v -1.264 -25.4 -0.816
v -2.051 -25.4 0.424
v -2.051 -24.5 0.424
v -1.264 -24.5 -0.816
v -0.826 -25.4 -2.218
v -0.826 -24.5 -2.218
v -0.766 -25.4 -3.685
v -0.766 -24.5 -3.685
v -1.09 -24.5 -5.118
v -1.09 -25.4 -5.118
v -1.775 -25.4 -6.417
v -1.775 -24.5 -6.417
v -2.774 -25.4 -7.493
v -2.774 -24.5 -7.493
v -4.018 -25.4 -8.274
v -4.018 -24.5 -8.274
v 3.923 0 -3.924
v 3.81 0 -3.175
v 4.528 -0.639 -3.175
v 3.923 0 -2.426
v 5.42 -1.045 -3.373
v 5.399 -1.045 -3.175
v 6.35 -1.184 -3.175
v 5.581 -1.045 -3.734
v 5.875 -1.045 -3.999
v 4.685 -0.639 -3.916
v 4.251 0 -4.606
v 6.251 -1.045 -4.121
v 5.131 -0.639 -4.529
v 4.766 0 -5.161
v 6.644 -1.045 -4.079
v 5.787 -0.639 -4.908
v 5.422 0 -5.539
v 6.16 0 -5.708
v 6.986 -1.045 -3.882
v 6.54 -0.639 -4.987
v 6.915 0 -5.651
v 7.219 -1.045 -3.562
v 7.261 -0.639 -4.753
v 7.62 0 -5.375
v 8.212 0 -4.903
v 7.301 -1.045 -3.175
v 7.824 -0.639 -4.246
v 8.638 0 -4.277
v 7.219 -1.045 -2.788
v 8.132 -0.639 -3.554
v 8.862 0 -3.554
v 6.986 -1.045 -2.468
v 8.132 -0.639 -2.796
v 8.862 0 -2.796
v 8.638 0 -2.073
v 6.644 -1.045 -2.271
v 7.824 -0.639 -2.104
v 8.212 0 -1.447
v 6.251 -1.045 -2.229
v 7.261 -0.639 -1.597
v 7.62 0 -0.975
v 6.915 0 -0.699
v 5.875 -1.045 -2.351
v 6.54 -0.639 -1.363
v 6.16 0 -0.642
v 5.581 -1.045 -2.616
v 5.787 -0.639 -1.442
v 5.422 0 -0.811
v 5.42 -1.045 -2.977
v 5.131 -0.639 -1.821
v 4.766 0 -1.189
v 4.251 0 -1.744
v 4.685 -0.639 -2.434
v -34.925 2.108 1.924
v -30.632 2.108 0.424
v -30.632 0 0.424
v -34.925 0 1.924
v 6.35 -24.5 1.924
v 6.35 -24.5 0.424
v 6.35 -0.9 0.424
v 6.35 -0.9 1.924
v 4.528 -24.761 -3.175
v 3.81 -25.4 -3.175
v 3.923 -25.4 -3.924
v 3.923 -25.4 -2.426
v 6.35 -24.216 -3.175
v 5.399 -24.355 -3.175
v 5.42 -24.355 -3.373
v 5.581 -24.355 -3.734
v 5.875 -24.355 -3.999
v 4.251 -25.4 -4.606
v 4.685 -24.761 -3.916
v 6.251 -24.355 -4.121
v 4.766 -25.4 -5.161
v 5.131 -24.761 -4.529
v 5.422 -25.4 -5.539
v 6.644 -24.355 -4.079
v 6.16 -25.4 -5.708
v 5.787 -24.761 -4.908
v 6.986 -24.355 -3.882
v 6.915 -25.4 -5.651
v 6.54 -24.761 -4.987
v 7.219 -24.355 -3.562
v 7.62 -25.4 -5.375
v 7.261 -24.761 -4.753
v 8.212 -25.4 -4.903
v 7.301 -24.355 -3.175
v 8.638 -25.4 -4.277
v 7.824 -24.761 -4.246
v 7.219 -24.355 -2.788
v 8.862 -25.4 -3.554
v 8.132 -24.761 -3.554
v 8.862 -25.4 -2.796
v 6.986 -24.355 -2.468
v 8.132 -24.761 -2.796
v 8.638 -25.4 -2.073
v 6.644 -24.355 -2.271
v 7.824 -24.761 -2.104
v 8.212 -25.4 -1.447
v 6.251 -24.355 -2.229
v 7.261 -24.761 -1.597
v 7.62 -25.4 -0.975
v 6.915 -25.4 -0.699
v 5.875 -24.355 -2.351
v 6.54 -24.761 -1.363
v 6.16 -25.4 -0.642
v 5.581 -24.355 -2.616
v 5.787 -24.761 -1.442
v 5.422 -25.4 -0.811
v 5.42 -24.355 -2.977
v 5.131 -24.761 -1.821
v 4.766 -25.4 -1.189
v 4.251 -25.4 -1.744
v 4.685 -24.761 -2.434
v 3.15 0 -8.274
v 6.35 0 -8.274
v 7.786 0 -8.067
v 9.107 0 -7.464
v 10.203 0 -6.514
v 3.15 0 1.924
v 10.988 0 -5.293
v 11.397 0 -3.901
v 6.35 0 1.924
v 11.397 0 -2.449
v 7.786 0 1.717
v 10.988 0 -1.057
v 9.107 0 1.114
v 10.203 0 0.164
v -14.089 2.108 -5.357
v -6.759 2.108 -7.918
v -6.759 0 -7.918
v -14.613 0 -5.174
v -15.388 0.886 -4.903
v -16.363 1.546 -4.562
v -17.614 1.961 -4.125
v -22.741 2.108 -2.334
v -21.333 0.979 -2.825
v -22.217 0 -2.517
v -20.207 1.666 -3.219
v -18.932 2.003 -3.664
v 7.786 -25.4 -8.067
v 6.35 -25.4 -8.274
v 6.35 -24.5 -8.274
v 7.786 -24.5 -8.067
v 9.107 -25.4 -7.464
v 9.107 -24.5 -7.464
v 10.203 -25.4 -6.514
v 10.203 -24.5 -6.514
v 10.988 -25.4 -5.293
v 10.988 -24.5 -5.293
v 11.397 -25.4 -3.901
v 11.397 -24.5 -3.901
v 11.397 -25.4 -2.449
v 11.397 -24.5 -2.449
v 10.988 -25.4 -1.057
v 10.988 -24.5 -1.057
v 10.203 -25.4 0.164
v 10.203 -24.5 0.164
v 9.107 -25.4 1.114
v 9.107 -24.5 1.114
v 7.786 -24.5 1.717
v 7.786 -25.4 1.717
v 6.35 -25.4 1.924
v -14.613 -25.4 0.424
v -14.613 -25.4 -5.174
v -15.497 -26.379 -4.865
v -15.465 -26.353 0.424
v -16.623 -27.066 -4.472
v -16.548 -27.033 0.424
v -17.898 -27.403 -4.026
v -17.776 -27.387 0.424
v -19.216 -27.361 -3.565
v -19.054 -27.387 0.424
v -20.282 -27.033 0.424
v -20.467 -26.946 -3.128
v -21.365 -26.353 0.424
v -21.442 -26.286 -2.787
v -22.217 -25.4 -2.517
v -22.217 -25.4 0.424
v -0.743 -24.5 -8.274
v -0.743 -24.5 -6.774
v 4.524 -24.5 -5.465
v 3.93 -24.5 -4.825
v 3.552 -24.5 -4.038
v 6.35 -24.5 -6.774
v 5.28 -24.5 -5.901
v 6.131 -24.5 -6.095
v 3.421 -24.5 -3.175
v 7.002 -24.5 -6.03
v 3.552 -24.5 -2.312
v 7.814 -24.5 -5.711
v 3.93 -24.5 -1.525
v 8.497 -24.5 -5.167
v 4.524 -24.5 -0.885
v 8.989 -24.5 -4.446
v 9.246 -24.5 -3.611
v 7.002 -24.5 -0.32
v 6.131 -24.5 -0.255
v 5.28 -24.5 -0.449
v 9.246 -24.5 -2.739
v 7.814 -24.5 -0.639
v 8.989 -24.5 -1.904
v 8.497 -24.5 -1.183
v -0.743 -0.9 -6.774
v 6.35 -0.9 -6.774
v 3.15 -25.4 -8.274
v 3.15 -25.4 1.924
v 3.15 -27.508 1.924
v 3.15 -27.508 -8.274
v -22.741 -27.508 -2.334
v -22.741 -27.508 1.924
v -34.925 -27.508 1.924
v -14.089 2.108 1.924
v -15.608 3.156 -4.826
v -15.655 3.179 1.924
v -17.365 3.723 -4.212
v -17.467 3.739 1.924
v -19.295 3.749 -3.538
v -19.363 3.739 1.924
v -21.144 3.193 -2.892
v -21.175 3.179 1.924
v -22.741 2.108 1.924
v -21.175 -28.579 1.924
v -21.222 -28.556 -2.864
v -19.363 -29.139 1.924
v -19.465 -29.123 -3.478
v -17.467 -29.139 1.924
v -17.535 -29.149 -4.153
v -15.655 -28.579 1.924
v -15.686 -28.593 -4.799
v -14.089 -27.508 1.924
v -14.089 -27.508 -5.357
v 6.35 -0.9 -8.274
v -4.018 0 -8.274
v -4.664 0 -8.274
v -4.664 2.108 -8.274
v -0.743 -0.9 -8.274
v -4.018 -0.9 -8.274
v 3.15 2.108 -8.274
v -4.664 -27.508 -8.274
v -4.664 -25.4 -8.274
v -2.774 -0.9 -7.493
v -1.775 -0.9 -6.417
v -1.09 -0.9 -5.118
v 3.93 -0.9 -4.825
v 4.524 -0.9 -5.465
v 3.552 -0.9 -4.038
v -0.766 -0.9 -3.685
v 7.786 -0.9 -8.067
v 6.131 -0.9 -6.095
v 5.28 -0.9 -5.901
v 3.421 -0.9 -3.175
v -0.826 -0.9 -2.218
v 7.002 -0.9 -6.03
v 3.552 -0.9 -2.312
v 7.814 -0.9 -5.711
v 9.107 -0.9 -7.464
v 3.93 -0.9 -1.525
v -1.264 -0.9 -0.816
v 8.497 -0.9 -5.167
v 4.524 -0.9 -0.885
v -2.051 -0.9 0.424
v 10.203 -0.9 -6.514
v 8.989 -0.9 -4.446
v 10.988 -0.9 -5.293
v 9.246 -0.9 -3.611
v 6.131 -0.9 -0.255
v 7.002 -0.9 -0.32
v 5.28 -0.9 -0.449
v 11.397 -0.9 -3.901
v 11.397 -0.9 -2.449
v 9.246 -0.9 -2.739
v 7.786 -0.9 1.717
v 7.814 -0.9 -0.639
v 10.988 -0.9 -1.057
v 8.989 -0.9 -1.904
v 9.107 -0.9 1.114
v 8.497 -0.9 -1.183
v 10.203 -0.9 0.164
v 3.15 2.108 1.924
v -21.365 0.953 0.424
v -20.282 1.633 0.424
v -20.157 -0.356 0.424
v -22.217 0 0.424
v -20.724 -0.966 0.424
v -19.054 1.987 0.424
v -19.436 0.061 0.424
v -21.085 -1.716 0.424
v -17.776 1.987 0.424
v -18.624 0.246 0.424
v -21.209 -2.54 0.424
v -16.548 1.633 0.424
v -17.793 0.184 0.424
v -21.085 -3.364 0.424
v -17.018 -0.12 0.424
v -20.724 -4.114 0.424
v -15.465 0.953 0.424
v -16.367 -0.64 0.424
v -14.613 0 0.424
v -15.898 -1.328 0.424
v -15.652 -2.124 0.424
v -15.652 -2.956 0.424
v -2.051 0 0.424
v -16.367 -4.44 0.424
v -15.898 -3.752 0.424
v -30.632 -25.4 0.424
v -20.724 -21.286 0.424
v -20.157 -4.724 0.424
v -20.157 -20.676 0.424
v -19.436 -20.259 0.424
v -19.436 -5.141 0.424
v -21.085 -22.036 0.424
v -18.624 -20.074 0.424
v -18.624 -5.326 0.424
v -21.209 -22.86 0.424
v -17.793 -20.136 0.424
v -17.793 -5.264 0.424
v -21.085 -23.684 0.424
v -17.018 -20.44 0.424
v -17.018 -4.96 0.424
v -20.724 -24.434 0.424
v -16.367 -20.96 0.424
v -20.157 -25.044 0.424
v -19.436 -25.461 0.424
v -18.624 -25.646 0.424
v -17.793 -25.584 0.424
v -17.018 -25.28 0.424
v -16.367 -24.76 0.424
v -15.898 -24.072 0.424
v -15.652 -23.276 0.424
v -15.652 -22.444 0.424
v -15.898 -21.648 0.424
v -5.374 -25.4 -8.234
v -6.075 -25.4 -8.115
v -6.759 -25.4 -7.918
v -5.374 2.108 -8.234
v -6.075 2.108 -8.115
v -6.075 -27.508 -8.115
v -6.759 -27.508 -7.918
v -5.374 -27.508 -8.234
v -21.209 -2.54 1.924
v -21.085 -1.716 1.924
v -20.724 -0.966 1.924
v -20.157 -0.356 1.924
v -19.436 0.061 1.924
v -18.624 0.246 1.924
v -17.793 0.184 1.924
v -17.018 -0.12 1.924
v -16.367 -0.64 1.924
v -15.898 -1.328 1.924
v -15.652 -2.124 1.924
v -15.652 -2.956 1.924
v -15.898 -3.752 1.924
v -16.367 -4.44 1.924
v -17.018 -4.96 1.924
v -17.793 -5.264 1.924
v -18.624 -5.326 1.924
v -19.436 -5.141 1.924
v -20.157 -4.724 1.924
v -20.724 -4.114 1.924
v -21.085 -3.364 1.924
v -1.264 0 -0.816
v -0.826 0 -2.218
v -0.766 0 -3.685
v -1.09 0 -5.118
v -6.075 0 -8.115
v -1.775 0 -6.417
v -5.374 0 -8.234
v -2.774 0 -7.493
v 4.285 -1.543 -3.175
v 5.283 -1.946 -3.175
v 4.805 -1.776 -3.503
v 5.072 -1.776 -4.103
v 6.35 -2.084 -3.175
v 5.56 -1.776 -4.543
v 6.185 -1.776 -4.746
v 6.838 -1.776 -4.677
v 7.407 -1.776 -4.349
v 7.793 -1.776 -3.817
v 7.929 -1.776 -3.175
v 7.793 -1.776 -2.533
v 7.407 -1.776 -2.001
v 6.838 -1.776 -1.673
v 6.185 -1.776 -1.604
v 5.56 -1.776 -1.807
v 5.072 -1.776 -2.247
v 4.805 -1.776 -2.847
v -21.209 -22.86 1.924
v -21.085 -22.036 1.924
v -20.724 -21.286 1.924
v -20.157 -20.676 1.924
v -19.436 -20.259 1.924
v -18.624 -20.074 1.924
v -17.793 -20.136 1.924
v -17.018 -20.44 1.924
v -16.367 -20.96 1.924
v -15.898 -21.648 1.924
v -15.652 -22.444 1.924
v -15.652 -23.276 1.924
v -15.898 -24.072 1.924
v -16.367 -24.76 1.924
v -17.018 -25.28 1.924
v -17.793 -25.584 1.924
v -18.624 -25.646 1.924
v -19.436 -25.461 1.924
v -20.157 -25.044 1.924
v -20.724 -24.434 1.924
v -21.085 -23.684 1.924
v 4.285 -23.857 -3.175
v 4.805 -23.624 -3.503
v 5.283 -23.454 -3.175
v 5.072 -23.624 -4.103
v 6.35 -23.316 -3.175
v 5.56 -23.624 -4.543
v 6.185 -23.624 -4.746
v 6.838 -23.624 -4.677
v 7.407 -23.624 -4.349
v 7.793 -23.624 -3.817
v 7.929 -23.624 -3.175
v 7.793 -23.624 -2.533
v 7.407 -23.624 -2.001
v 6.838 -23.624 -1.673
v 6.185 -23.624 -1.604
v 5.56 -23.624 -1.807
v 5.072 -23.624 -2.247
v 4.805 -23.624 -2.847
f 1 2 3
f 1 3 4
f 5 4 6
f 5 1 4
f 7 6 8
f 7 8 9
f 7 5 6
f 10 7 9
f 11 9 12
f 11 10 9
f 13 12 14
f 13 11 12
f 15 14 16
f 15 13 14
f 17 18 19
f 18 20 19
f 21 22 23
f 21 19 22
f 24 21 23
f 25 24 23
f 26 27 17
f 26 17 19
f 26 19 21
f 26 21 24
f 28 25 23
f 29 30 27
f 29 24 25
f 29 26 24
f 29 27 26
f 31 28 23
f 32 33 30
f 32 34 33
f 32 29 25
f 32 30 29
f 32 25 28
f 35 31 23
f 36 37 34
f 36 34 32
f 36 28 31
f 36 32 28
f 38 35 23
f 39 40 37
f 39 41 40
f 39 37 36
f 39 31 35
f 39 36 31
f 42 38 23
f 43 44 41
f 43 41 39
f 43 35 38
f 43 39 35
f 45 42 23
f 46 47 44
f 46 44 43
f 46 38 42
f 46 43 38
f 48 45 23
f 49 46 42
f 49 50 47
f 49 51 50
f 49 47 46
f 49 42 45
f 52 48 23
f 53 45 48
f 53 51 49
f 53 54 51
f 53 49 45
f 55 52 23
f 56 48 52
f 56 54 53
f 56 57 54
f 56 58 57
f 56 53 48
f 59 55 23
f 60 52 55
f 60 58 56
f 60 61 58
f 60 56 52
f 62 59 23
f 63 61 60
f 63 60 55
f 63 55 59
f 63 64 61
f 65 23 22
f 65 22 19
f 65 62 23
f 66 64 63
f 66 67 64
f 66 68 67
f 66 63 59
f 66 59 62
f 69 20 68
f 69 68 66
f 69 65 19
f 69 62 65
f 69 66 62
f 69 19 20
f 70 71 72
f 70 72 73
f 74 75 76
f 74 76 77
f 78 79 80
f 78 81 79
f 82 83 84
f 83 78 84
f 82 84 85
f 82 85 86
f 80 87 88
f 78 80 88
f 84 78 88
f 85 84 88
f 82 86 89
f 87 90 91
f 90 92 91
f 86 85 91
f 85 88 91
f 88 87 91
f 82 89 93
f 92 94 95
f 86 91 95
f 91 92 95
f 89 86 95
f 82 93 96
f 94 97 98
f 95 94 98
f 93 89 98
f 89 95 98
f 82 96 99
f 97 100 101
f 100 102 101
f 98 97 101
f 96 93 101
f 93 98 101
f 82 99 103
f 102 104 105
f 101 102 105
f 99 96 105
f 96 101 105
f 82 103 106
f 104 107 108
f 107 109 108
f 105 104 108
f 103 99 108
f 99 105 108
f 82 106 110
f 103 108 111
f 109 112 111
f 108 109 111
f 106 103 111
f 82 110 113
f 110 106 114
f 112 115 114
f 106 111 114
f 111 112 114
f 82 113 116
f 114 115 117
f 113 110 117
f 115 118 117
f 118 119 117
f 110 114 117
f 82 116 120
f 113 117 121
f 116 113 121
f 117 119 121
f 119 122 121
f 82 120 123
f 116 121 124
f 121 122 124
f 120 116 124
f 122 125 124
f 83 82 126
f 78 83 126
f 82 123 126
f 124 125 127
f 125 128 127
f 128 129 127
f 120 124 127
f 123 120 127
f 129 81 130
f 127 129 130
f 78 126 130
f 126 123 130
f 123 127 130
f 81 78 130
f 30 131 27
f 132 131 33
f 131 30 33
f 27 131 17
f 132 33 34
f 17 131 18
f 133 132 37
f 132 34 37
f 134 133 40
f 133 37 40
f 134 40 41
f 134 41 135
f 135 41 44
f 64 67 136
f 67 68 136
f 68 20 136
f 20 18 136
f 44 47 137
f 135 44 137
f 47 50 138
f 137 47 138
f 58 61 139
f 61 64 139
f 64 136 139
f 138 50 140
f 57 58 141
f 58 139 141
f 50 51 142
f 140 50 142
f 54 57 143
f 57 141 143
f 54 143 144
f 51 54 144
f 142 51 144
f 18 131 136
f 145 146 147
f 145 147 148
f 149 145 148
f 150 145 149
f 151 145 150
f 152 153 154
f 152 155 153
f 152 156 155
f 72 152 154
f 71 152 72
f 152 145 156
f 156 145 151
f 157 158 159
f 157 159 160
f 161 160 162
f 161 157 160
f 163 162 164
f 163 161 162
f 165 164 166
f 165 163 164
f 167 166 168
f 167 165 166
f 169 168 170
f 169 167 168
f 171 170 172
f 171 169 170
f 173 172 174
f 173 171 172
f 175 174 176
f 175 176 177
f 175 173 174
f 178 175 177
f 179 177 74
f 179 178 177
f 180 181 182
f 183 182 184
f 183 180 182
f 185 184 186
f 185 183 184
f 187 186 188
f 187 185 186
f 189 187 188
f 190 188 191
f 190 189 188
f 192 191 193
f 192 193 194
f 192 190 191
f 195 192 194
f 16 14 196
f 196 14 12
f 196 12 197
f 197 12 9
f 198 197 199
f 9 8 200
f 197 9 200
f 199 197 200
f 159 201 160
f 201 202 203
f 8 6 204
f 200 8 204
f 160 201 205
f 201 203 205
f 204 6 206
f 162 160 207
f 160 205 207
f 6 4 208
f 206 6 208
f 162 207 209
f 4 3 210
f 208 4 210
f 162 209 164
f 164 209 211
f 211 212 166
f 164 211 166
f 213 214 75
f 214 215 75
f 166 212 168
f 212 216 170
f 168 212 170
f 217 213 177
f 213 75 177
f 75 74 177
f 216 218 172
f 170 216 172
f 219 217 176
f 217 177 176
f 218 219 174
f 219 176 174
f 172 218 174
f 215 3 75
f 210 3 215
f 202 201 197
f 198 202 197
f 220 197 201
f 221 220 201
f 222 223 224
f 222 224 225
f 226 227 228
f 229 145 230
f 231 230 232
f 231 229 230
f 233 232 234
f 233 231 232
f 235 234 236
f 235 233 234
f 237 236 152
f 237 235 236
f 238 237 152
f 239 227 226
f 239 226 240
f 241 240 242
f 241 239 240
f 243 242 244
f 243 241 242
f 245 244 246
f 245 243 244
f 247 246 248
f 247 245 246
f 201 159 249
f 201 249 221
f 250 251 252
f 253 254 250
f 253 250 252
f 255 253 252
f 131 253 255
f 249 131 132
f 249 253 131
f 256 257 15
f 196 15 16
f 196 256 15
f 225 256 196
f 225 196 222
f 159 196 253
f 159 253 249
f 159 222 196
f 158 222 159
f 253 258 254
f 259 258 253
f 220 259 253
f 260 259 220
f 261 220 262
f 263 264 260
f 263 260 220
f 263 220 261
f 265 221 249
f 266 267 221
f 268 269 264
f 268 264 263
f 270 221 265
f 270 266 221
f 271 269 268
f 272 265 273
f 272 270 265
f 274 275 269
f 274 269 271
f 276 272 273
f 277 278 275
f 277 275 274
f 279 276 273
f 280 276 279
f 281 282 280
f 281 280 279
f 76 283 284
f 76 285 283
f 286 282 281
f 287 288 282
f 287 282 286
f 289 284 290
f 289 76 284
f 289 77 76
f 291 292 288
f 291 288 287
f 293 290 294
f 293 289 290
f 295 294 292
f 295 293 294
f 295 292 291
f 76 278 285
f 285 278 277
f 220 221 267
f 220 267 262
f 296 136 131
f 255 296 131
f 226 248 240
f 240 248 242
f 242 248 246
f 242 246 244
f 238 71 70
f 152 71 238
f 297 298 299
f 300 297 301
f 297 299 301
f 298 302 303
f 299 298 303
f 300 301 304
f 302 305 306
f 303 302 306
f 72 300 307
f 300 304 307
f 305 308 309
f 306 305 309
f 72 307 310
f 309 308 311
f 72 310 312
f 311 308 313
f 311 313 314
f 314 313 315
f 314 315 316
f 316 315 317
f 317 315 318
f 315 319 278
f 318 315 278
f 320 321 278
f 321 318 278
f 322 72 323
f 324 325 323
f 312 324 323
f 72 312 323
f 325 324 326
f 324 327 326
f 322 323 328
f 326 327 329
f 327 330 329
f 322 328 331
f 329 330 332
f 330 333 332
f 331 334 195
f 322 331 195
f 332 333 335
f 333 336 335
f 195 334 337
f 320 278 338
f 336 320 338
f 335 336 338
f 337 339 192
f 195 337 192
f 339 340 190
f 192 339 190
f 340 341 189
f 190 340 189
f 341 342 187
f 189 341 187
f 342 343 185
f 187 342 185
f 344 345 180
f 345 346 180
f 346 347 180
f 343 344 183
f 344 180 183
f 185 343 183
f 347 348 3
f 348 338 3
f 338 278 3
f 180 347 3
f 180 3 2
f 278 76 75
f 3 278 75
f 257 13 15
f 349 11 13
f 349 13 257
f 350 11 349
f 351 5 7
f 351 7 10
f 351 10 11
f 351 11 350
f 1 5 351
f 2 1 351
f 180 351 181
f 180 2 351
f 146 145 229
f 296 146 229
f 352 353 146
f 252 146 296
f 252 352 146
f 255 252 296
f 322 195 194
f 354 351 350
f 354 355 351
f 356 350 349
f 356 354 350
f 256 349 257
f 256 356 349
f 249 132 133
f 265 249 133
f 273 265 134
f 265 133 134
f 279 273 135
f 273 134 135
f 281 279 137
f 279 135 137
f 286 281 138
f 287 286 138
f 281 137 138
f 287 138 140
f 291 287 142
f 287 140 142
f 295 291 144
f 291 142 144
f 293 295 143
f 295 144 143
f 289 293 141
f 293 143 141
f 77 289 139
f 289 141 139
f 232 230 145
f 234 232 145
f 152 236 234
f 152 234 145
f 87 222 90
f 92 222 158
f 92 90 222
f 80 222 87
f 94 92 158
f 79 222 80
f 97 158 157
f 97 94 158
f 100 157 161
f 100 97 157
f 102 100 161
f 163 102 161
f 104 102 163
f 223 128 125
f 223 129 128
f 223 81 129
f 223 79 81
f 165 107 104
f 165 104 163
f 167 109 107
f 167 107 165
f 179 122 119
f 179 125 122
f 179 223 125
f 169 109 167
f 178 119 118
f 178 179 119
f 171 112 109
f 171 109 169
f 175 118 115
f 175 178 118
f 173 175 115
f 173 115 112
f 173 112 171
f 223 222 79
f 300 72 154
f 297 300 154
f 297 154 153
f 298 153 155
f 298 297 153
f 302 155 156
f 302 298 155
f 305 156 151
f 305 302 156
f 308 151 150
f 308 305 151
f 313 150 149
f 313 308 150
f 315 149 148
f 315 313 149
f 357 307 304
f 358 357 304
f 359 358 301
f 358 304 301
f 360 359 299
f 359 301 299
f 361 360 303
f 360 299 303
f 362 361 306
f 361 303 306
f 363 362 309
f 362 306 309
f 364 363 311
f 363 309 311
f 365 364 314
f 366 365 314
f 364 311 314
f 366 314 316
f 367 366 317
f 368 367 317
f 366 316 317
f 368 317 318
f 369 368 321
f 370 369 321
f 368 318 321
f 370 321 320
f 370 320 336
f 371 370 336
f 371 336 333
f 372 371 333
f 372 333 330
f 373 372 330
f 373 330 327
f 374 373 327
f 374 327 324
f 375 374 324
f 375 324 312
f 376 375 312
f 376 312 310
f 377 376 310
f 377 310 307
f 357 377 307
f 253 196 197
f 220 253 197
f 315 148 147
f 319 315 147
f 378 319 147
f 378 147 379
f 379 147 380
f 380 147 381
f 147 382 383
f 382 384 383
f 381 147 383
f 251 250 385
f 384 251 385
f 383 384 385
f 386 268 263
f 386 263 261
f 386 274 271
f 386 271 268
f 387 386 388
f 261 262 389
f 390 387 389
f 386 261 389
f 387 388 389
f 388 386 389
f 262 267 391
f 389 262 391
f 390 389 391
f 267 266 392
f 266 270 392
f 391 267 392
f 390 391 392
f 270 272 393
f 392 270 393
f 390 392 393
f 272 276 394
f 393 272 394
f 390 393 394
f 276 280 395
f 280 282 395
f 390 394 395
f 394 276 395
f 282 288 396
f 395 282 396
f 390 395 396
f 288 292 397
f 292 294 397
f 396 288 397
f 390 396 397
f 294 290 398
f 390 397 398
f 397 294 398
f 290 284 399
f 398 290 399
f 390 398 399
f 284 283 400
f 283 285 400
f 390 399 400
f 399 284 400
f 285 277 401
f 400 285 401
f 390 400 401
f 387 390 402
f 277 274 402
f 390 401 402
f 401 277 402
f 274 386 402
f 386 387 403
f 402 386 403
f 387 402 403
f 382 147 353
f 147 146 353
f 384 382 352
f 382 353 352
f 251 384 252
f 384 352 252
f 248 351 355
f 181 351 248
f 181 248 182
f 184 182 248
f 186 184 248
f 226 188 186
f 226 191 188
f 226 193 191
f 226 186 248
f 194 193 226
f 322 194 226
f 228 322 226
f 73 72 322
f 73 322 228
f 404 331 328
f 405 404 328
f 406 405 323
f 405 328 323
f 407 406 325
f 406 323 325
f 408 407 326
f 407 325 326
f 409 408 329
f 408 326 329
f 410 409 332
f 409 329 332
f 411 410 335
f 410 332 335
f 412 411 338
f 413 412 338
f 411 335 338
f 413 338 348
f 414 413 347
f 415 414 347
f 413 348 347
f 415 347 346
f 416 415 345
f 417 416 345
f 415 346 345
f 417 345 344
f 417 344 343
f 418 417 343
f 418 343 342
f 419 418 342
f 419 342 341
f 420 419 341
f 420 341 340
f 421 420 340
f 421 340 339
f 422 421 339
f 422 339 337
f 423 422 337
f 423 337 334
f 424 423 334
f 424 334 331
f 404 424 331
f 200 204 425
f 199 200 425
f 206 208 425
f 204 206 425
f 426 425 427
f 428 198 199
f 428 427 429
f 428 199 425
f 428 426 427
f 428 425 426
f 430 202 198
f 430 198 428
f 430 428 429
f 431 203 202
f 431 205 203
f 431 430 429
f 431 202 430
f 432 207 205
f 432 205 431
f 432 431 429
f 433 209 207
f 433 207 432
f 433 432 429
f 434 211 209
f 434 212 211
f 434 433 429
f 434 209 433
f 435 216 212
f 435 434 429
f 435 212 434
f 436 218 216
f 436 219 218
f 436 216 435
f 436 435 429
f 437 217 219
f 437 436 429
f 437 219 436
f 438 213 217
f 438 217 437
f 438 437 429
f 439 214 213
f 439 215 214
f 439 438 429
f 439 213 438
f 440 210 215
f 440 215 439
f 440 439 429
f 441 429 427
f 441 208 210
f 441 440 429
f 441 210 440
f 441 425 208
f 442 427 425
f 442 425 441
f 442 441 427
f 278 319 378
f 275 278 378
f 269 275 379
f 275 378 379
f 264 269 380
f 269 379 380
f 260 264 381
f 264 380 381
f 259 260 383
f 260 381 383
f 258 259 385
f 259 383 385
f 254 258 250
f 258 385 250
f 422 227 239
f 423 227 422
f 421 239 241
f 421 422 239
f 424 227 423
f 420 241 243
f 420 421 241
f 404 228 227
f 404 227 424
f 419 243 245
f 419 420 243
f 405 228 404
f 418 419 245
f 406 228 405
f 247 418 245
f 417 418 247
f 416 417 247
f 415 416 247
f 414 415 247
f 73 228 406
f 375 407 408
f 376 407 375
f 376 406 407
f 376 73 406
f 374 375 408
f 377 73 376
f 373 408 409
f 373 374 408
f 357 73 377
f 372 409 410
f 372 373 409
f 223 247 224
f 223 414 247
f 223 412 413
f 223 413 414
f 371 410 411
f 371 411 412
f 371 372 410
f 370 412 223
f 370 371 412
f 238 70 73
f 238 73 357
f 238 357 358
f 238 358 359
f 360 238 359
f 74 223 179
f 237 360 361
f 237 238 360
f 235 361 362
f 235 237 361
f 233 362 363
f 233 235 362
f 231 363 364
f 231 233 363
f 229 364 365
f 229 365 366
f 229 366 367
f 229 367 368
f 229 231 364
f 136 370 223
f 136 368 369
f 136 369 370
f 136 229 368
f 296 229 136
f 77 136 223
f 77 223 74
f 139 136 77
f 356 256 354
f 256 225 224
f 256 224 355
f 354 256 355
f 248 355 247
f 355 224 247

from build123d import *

# Parameters (mm, degrees)
BOSS_EXTRUDE2_DEPTH = 2.1082
BOSS_EXTRUDE3_DEPTH = 0.9
SKETCH13_W          = 8.400608993
SKETCH13_H          = 1.5
BOSS_EXTRUDE4_DEPTH = 12.7
SKETCH16_W          = 7.09322036
SKETCH16_H          = 1.5
BOSS_EXTRUDE5_DEPTH = 11.8
BOSS_EXTRUDE6_DEPTH = 2.1082
BOSS_EXTRUDE7_REACH = 45.656
BOSS_EXTRUDE8_DEPTH = 2.1082
FILLET1_R           = 6.35
SKETCH20_R          = 2.794
CUT_EXTRUDE1_DEPTH  = 46.30015706
SKETCH21_R          = 4.572
CUT_EXTRUDE2_DEPTH  = 46.30015706
BOSS_EXTRUDE9_REACH = 47.612


with BuildPart() as part:
    # Sketch6 → Boss-Extrude2 (new body)
    with BuildSketch(Plane(origin=(0, 0, 0), x_dir=(1, 0, 0), z_dir=(0, 1, 0))):
        with BuildLine():
            Line((3.1496, 3.175), (3.1496, 8.27377964))
            Line((3.1496, 8.27377964), (-5.741348421, 8.27377964))
            Line((-5.741348421, 8.27377964), (-8.59506403, 5.42006403))
            ThreePointArc((-8.59506403, 5.42006403), (-9.283317516, 4.390019898), (-9.525, 3.175))
            Line((-9.525, 3.175), (-9.525, -1.92377964))
            Line((-9.525, -1.92377964), (-6.989909723, -1.92377964))
            Line((-6.989909723, -1.92377964), (3.1496, -1.92377964))
            Line((3.1496, -1.92377964), (3.1496, 3.175))
        make_face()
    extrude(amount=BOSS_EXTRUDE2_DEPTH)

    # Sketch7 → Boss-Extrude3 (add)
    with BuildSketch(Plane.XZ):
        with BuildLine():
            Line((-2.050608993, 1.92377964), (-2.050608993, 0.42377964))
            ThreePointArc((-2.050608993, 0.42377964), (-0.881374643, -4.411978027), (-4.017957094, -8.27377964))
            Line((-4.017957094, -8.27377964), (6.35, -8.27377964))
            ThreePointArc((6.35, -8.27377964), (11.44877964, -3.175), (6.35, 1.92377964))
            Line((6.35, 1.92377964), (-2.050608993, 1.92377964))
        make_face()
    extrude(amount=BOSS_EXTRUDE3_DEPTH)

    # Sketch11 → Revolve4 (revolve)
    with BuildSketch(Plane.XY.offset(-3.175), mode=Mode.PRIVATE) as revolve4_sk:
        with BuildLine():
            Line((6.35, -0.9), (6.35, -2.083581452))
            ThreePointArc((6.35, -2.083581452), (7.929346537, -1.776499661), (9.278562256, -0.9))
            Line((9.278562256, -0.9), (6.35, -0.9))
        make_face()
    revolve(revolve4_sk.sketch.rotate(Axis((6.35, -0.9, -3.175), (0, -1, 0)), 180), axis=Axis((6.35, -0.9, -3.175), (0, -1, 0)))

    # Sketch12 → Cut-Revolve1 (revolve, cut)
    with BuildSketch(Plane.XY.offset(-3.175), mode=Mode.PRIVATE) as cut_revolve1_sk:
        with BuildLine():
            Line((8.89, 0), (6.35, 0))
            Line((6.35, 0), (6.35, -1.184421452))
            ThreePointArc((6.35, -1.184421452), (7.751289957, -0.873762947), (8.89, 0))
        make_face()
    revolve(cut_revolve1_sk.sketch.rotate(Axis((6.35, 0, -3.175), (0, -1, 0)), 180), axis=Axis((6.35, 0, -3.175), (0, -1, 0)), mode=Mode.SUBTRACT)

    # Sketch13 → Boss-Extrude4 (add)
    with BuildSketch(Plane.XZ):
        with Locations((2.149695504, 1.17377964)):
            Rectangle(SKETCH13_W, SKETCH13_H)
    extrude(amount=BOSS_EXTRUDE4_DEPTH)

    # Sketch16 → Boss-Extrude5 (add)
    with BuildSketch(Plane.XZ.offset(0.9)):
        with Locations((2.80338982, -7.52377964)):
            Rectangle(SKETCH16_W, SKETCH16_H)
    extrude(amount=BOSS_EXTRUDE5_DEPTH)

    # Mirror1: part across plane


with BuildPart() as part_1:
    add(part.part)
    add(part.part.mirror(Plane(origin=(6.35, -12.7, 1.92377964), x_dir=(0, 0, 1), z_dir=(0, 1, 0))))

    # Sketch17 → Boss-Extrude6 (add)
    with BuildSketch(Plane.XZ.offset(27.5082)):
        with BuildLine():
            Line((-5.741348421, -8.27377964), (-34.925, 1.92377964))
            Line((-34.925, 1.92377964), (-9.525, 1.92377964))
            Line((-9.525, 1.92377964), (-9.525, -3.175))
            ThreePointArc((-9.525, -3.175), (-9.283317516, -4.390019898), (-8.59506403, -5.42006403))
            Line((-8.59506403, -5.42006403), (-5.741348421, -8.27377964))
        make_face()
    extrude(amount=-BOSS_EXTRUDE6_DEPTH)

    # Boss-Extrude7: up to this face of the body (flat: up to its plane)
    boss_extrude7_end = Plane(part_1.part.faces().sort_by_distance((-20.33317421, -26.4541, -3.175))[0])
    # Sketch18 → Boss-Extrude7 (add, up to the picked face)
    with BuildSketch(Plane.ZY.offset(2.050608993), mode=Mode.PRIVATE) as boss_extrude7_sk1:
        Polygon((1.92377964, 0), (0.42377964, 0), (0.42377964, -0.9), (0.42377964, -24.5), (0.42377964, -25.4), (1.92377964, -25.4), align=None)
    boss_extrude7_tool1 = split(extrude(boss_extrude7_sk1.sketch, amount=BOSS_EXTRUDE7_REACH, mode=Mode.PRIVATE), bisect_by=boss_extrude7_end, keep=Keep.BOTH, mode=Mode.PRIVATE)
    add(boss_extrude7_tool1.solids().sort_by(Axis((-2.050609, -12.7, 1.17378), (-1, 0, 0)))[0])

    # Sketch19 → Boss-Extrude8 (add)
    with BuildSketch(Plane(origin=(0, 2.1082, 0), x_dir=(1, 0, 0), z_dir=(0, 1, 0))):
        with BuildLine():
            Line((-5.741348421, 8.27377964), (-30.632259338, -0.42377964))
            Line((-30.632259338, -0.42377964), (-9.525, -0.42377964))
            Line((-9.525, -0.42377964), (-9.525, 3.175))
            ThreePointArc((-9.525, 3.175), (-9.283317516, 4.390019898), (-8.59506403, 5.42006403))
            Line((-8.59506403, 5.42006403), (-5.741348421, 8.27377964))
        make_face()
        Polygon((-9.525, -0.42377964), (-30.632259338, -0.42377964), (-34.925, -1.92377964), (-9.525, -1.92377964), align=None)
    extrude(amount=-BOSS_EXTRUDE8_DEPTH)

    # Fillet1
    fillet1_edges = [part_1.edges().sort_by_distance(p)[0] for p in [
        (-5.741348421, 1.0541, -8.27377964),
        (-5.741348421, -26.4541, -8.27377964),
    ]]
    fillet(fillet1_edges, radius=FILLET1_R)

    # Sketch20 → Cut-Extrude1 (cut, through all)
    with BuildSketch(Plane(origin=(0, 0, 0.42377964), x_dir=(-1, 0, 0), z_dir=(0, 0, -1))):
        with Locations((18.415, -22.86)):
            Circle(SKETCH20_R)
        with Locations((18.415, -2.54)):
            Circle(SKETCH20_R)
    extrude(amount=-CUT_EXTRUDE1_DEPTH, mode=Mode.SUBTRACT)

    # Sketch21 → Cut-Extrude2 (cut, through all)
    with BuildSketch(Plane(origin=(0, 0, 0.42377964), x_dir=(-1, 0, 0), z_dir=(0, 0, -1))):
        with Locations((18.415, -22.86)):
            Circle(SKETCH21_R)
        with Locations((18.415, -2.54)):
            Circle(SKETCH21_R)
    extrude(amount=CUT_EXTRUDE2_DEPTH, mode=Mode.SUBTRACT)

    # Boss-Extrude9: up to this plane
    boss_extrude9_end = Plane(origin=(-5.741348421, 5.514005479, -8.27377964), z_dir=(-0.3298685861491406, 0, -0.9440268618381402))
    # Sketch22 → Boss-Extrude9 (add, up to the surface)
    with BuildSketch(Plane.XY.offset(1.92377964), mode=Mode.PRIVATE) as boss_extrude9_sk1:
        with BuildLine():
            Line((-14.088715594, -27.5082), (-22.741284406, -27.5082))
            ThreePointArc((-22.741284406, -27.5082), (-18.415, -29.21), (-14.088715594, -27.5082))
        make_face()
    boss_extrude9_tool1 = split(extrude(boss_extrude9_sk1.sketch, amount=-BOSS_EXTRUDE9_REACH, mode=Mode.PRIVATE), bisect_by=boss_extrude9_end, keep=Keep.BOTH, mode=Mode.PRIVATE)
    add(boss_extrude9_tool1.solids().sort_by_distance((-18.415, -28.197399, 1.92378))[0])
    # Sketch22 → Boss-Extrude9 (add, up to the surface)
    with BuildSketch(Plane.XY.offset(1.92377964), mode=Mode.PRIVATE) as boss_extrude9_sk2:
        with BuildLine():
            Line((-22.741284406, 2.1082), (-14.088715594, 2.1082))
            ThreePointArc((-14.088715594, 2.1082), (-18.415, 3.81), (-22.741284406, 2.1082))
        make_face()
    boss_extrude9_tool2 = split(extrude(boss_extrude9_sk2.sketch, amount=-BOSS_EXTRUDE9_REACH, mode=Mode.PRIVATE), bisect_by=boss_extrude9_end, keep=Keep.BOTH, mode=Mode.PRIVATE)
    add(boss_extrude9_tool2.solids().sort_by_distance((-18.415, 2.797399, 1.92378))[0])


solid = part_1.part
